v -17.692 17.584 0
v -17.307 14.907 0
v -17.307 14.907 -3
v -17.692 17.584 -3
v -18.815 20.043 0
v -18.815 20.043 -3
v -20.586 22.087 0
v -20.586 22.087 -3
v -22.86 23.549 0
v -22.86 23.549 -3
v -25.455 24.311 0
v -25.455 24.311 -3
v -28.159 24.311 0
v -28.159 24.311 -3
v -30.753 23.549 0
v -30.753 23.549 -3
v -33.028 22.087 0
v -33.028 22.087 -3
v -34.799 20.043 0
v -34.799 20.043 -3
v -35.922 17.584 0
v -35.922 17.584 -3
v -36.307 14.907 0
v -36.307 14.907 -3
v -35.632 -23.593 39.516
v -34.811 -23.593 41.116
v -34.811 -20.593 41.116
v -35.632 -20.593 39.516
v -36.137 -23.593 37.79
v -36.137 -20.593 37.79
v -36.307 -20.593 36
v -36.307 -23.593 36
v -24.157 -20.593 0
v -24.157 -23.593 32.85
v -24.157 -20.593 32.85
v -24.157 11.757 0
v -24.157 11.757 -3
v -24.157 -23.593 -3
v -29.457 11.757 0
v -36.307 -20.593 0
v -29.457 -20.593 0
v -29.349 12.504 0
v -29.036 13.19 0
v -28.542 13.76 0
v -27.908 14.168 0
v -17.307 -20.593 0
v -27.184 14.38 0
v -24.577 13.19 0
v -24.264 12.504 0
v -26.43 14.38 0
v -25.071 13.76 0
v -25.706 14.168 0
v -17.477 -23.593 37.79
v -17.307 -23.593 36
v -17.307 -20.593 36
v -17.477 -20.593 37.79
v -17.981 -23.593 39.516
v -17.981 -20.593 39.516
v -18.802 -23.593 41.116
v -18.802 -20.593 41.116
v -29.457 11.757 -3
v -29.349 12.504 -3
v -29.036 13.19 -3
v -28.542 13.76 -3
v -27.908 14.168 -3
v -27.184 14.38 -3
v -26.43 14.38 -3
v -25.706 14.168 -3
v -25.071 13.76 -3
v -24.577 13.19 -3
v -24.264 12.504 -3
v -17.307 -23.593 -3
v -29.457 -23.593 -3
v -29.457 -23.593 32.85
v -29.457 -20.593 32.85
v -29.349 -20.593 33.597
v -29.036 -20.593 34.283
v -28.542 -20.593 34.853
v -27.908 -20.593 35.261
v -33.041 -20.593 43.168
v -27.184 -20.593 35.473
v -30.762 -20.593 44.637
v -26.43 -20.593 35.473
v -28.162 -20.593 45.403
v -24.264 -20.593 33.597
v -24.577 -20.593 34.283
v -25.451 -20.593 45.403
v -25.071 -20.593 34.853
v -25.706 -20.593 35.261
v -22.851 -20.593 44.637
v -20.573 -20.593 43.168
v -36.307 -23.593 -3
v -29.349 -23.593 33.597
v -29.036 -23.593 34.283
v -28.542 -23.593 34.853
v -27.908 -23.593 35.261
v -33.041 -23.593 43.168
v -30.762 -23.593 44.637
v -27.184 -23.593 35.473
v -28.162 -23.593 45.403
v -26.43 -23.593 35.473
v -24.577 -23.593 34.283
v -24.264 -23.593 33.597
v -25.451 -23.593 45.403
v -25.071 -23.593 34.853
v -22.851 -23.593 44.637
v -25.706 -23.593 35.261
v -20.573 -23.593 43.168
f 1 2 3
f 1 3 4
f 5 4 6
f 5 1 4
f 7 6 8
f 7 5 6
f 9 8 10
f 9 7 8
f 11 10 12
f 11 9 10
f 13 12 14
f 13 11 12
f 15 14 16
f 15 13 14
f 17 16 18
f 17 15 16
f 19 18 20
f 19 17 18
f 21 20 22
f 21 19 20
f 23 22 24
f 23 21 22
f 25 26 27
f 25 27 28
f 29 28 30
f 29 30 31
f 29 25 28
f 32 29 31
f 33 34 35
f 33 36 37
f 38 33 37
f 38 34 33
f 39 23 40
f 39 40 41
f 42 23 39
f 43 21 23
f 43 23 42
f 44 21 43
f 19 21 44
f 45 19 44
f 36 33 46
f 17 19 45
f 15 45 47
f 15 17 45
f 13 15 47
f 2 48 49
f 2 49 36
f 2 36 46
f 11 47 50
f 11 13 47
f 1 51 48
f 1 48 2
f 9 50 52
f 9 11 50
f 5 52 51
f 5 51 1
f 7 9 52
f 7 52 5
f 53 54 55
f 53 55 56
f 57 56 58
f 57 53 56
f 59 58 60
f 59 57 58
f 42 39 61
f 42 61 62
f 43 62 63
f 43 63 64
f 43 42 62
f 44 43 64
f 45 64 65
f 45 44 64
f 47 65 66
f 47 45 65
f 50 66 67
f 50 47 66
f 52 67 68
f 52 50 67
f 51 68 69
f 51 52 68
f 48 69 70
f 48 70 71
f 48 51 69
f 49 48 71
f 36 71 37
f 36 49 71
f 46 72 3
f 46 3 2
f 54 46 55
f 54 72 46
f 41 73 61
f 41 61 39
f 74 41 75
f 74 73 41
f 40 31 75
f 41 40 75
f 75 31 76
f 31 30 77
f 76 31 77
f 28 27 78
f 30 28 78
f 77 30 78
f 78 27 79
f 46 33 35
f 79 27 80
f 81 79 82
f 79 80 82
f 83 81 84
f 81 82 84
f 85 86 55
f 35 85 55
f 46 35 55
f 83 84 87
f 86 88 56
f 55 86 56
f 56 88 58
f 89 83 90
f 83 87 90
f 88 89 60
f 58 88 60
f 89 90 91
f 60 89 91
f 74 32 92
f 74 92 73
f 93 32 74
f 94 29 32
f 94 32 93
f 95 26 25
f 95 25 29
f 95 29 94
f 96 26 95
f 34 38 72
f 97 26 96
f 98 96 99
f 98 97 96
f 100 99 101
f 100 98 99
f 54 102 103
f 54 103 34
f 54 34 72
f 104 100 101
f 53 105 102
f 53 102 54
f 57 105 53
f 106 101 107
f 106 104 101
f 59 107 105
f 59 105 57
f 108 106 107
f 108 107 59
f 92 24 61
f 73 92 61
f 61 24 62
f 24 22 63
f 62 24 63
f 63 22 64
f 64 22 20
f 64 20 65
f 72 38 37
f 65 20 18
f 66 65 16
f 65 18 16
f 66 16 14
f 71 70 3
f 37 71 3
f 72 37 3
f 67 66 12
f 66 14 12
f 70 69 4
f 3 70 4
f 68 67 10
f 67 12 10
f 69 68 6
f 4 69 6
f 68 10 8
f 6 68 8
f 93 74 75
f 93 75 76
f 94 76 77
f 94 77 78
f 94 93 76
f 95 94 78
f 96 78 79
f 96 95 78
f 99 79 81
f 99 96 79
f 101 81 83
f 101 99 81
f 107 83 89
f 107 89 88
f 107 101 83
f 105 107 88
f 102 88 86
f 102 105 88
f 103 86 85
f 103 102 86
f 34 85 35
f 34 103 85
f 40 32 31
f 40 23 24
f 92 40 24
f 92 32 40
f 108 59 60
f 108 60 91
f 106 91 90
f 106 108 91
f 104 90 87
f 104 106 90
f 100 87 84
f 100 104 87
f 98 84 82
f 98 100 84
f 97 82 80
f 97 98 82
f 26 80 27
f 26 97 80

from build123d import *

# Parameters (mm, degrees)
EXTRUDE_1_DEPTH = 3
EXTRUDE_2_DEPTH = 3


with BuildPart() as part:
    # 草图1 → 凸台-拉伸1 (new body)
    with BuildSketch(Plane.XY):
        with BuildLine():
            ThreePointArc((-17.306693672, 14.907284768), (-26.806693672, 24.407284768), (-36.306693672, 14.907284768))
            ThreePointArc((-36.306693672, 14.907284768), (-34.403568029, 9.203119623), (-29.456693672, 5.784374048))
            Line((-29.456693672, 5.784374048), (-29.456693672, 11.757284768))
            ThreePointArc((-29.456693672, 11.757284768), (-26.806693672, 14.407284768), (-24.156693672, 11.757284768))
            Line((-24.156693672, 11.757284768), (-24.156693672, 5.784374048))
            ThreePointArc((-24.156693672, 5.784374048), (-19.209819315, 9.203119623), (-17.306693672, 14.907284768))
        make_face()
        with BuildLine():
            ThreePointArc((-29.456693672, 5.784374048), (-34.403568029, 9.203119623), (-36.306693672, 14.907284768))
            Line((-36.306693672, 14.907284768), (-36.306693672, -23.592715232))
            Line((-36.306693672, -23.592715232), (-29.456693672, -23.592715232))
            Line((-29.456693672, -23.592715232), (-29.456693672, 5.784374048))
        make_face()
        with BuildLine():
            Line((-17.306693672, -23.592715232), (-17.306693672, 14.907284768))
            ThreePointArc((-17.306693672, 14.907284768), (-19.209819315, 9.203119623), (-24.156693672, 5.784374048))
            Line((-24.156693672, 5.784374048), (-24.156693672, -23.592715232))
            Line((-24.156693672, -23.592715232), (-17.306693672, -23.592715232))
        make_face()
    extrude(amount=-EXTRUDE_1_DEPTH)

    # 草图2 → 凸台-拉伸2 (add)
    with BuildSketch(Plane.XZ.offset(23.592715232)):
        with BuildLine():
            ThreePointArc((-34.81143952, 41.116057458), (-35.925221118, 38.665043569), (-36.306693672, 36))
            ThreePointArc((-36.306693672, 36), (-34.403568029, 30.295834855), (-29.456693672, 26.87708928))
            Line((-29.456693672, 26.87708928), (-29.456693672, 32.85))
            ThreePointArc((-29.456693672, 32.85), (-26.806693672, 35.5), (-24.156693672, 32.85))
            Line((-24.156693672, 32.85), (-24.156693672, 26.87708928))
            ThreePointArc((-24.156693672, 26.87708928), (-19.209819315, 30.295834855), (-17.306693672, 36))
            ThreePointArc((-17.306693672, 36), (-17.688166227, 38.665043569), (-18.801947824, 41.116057458))
            Line((-18.801947824, 41.116057458), (-34.81143952, 41.116057458))
        make_face()
        with BuildLine():
            ThreePointArc((-18.801947824, 41.116057458), (-26.806693672, 45.5), (-34.81143952, 41.116057458))
            Line((-34.81143952, 41.116057458), (-18.801947824, 41.116057458))
        make_face()
        with BuildLine():
            Line((-36.306693672, 36), (-36.306693672, 0))
            Line((-36.306693672, 0), (-29.456693672, 0))
            Line((-29.456693672, 0), (-29.456693672, 26.87708928))
            ThreePointArc((-29.456693672, 26.87708928), (-34.403568029, 30.295834855), (-36.306693672, 36))
        make_face()
        with BuildLine():
            Line((-24.156693672, 26.87708928), (-24.156693672, -3))
            Line((-24.156693672, -3), (-17.306693672, -3))
            Line((-17.306693672, -3), (-17.306693672, 36))
            ThreePointArc((-17.306693672, 36), (-19.209819315, 30.295834855), (-24.156693672, 26.87708928))
        make_face()
    extrude(amount=-EXTRUDE_2_DEPTH)


solid = part.part
